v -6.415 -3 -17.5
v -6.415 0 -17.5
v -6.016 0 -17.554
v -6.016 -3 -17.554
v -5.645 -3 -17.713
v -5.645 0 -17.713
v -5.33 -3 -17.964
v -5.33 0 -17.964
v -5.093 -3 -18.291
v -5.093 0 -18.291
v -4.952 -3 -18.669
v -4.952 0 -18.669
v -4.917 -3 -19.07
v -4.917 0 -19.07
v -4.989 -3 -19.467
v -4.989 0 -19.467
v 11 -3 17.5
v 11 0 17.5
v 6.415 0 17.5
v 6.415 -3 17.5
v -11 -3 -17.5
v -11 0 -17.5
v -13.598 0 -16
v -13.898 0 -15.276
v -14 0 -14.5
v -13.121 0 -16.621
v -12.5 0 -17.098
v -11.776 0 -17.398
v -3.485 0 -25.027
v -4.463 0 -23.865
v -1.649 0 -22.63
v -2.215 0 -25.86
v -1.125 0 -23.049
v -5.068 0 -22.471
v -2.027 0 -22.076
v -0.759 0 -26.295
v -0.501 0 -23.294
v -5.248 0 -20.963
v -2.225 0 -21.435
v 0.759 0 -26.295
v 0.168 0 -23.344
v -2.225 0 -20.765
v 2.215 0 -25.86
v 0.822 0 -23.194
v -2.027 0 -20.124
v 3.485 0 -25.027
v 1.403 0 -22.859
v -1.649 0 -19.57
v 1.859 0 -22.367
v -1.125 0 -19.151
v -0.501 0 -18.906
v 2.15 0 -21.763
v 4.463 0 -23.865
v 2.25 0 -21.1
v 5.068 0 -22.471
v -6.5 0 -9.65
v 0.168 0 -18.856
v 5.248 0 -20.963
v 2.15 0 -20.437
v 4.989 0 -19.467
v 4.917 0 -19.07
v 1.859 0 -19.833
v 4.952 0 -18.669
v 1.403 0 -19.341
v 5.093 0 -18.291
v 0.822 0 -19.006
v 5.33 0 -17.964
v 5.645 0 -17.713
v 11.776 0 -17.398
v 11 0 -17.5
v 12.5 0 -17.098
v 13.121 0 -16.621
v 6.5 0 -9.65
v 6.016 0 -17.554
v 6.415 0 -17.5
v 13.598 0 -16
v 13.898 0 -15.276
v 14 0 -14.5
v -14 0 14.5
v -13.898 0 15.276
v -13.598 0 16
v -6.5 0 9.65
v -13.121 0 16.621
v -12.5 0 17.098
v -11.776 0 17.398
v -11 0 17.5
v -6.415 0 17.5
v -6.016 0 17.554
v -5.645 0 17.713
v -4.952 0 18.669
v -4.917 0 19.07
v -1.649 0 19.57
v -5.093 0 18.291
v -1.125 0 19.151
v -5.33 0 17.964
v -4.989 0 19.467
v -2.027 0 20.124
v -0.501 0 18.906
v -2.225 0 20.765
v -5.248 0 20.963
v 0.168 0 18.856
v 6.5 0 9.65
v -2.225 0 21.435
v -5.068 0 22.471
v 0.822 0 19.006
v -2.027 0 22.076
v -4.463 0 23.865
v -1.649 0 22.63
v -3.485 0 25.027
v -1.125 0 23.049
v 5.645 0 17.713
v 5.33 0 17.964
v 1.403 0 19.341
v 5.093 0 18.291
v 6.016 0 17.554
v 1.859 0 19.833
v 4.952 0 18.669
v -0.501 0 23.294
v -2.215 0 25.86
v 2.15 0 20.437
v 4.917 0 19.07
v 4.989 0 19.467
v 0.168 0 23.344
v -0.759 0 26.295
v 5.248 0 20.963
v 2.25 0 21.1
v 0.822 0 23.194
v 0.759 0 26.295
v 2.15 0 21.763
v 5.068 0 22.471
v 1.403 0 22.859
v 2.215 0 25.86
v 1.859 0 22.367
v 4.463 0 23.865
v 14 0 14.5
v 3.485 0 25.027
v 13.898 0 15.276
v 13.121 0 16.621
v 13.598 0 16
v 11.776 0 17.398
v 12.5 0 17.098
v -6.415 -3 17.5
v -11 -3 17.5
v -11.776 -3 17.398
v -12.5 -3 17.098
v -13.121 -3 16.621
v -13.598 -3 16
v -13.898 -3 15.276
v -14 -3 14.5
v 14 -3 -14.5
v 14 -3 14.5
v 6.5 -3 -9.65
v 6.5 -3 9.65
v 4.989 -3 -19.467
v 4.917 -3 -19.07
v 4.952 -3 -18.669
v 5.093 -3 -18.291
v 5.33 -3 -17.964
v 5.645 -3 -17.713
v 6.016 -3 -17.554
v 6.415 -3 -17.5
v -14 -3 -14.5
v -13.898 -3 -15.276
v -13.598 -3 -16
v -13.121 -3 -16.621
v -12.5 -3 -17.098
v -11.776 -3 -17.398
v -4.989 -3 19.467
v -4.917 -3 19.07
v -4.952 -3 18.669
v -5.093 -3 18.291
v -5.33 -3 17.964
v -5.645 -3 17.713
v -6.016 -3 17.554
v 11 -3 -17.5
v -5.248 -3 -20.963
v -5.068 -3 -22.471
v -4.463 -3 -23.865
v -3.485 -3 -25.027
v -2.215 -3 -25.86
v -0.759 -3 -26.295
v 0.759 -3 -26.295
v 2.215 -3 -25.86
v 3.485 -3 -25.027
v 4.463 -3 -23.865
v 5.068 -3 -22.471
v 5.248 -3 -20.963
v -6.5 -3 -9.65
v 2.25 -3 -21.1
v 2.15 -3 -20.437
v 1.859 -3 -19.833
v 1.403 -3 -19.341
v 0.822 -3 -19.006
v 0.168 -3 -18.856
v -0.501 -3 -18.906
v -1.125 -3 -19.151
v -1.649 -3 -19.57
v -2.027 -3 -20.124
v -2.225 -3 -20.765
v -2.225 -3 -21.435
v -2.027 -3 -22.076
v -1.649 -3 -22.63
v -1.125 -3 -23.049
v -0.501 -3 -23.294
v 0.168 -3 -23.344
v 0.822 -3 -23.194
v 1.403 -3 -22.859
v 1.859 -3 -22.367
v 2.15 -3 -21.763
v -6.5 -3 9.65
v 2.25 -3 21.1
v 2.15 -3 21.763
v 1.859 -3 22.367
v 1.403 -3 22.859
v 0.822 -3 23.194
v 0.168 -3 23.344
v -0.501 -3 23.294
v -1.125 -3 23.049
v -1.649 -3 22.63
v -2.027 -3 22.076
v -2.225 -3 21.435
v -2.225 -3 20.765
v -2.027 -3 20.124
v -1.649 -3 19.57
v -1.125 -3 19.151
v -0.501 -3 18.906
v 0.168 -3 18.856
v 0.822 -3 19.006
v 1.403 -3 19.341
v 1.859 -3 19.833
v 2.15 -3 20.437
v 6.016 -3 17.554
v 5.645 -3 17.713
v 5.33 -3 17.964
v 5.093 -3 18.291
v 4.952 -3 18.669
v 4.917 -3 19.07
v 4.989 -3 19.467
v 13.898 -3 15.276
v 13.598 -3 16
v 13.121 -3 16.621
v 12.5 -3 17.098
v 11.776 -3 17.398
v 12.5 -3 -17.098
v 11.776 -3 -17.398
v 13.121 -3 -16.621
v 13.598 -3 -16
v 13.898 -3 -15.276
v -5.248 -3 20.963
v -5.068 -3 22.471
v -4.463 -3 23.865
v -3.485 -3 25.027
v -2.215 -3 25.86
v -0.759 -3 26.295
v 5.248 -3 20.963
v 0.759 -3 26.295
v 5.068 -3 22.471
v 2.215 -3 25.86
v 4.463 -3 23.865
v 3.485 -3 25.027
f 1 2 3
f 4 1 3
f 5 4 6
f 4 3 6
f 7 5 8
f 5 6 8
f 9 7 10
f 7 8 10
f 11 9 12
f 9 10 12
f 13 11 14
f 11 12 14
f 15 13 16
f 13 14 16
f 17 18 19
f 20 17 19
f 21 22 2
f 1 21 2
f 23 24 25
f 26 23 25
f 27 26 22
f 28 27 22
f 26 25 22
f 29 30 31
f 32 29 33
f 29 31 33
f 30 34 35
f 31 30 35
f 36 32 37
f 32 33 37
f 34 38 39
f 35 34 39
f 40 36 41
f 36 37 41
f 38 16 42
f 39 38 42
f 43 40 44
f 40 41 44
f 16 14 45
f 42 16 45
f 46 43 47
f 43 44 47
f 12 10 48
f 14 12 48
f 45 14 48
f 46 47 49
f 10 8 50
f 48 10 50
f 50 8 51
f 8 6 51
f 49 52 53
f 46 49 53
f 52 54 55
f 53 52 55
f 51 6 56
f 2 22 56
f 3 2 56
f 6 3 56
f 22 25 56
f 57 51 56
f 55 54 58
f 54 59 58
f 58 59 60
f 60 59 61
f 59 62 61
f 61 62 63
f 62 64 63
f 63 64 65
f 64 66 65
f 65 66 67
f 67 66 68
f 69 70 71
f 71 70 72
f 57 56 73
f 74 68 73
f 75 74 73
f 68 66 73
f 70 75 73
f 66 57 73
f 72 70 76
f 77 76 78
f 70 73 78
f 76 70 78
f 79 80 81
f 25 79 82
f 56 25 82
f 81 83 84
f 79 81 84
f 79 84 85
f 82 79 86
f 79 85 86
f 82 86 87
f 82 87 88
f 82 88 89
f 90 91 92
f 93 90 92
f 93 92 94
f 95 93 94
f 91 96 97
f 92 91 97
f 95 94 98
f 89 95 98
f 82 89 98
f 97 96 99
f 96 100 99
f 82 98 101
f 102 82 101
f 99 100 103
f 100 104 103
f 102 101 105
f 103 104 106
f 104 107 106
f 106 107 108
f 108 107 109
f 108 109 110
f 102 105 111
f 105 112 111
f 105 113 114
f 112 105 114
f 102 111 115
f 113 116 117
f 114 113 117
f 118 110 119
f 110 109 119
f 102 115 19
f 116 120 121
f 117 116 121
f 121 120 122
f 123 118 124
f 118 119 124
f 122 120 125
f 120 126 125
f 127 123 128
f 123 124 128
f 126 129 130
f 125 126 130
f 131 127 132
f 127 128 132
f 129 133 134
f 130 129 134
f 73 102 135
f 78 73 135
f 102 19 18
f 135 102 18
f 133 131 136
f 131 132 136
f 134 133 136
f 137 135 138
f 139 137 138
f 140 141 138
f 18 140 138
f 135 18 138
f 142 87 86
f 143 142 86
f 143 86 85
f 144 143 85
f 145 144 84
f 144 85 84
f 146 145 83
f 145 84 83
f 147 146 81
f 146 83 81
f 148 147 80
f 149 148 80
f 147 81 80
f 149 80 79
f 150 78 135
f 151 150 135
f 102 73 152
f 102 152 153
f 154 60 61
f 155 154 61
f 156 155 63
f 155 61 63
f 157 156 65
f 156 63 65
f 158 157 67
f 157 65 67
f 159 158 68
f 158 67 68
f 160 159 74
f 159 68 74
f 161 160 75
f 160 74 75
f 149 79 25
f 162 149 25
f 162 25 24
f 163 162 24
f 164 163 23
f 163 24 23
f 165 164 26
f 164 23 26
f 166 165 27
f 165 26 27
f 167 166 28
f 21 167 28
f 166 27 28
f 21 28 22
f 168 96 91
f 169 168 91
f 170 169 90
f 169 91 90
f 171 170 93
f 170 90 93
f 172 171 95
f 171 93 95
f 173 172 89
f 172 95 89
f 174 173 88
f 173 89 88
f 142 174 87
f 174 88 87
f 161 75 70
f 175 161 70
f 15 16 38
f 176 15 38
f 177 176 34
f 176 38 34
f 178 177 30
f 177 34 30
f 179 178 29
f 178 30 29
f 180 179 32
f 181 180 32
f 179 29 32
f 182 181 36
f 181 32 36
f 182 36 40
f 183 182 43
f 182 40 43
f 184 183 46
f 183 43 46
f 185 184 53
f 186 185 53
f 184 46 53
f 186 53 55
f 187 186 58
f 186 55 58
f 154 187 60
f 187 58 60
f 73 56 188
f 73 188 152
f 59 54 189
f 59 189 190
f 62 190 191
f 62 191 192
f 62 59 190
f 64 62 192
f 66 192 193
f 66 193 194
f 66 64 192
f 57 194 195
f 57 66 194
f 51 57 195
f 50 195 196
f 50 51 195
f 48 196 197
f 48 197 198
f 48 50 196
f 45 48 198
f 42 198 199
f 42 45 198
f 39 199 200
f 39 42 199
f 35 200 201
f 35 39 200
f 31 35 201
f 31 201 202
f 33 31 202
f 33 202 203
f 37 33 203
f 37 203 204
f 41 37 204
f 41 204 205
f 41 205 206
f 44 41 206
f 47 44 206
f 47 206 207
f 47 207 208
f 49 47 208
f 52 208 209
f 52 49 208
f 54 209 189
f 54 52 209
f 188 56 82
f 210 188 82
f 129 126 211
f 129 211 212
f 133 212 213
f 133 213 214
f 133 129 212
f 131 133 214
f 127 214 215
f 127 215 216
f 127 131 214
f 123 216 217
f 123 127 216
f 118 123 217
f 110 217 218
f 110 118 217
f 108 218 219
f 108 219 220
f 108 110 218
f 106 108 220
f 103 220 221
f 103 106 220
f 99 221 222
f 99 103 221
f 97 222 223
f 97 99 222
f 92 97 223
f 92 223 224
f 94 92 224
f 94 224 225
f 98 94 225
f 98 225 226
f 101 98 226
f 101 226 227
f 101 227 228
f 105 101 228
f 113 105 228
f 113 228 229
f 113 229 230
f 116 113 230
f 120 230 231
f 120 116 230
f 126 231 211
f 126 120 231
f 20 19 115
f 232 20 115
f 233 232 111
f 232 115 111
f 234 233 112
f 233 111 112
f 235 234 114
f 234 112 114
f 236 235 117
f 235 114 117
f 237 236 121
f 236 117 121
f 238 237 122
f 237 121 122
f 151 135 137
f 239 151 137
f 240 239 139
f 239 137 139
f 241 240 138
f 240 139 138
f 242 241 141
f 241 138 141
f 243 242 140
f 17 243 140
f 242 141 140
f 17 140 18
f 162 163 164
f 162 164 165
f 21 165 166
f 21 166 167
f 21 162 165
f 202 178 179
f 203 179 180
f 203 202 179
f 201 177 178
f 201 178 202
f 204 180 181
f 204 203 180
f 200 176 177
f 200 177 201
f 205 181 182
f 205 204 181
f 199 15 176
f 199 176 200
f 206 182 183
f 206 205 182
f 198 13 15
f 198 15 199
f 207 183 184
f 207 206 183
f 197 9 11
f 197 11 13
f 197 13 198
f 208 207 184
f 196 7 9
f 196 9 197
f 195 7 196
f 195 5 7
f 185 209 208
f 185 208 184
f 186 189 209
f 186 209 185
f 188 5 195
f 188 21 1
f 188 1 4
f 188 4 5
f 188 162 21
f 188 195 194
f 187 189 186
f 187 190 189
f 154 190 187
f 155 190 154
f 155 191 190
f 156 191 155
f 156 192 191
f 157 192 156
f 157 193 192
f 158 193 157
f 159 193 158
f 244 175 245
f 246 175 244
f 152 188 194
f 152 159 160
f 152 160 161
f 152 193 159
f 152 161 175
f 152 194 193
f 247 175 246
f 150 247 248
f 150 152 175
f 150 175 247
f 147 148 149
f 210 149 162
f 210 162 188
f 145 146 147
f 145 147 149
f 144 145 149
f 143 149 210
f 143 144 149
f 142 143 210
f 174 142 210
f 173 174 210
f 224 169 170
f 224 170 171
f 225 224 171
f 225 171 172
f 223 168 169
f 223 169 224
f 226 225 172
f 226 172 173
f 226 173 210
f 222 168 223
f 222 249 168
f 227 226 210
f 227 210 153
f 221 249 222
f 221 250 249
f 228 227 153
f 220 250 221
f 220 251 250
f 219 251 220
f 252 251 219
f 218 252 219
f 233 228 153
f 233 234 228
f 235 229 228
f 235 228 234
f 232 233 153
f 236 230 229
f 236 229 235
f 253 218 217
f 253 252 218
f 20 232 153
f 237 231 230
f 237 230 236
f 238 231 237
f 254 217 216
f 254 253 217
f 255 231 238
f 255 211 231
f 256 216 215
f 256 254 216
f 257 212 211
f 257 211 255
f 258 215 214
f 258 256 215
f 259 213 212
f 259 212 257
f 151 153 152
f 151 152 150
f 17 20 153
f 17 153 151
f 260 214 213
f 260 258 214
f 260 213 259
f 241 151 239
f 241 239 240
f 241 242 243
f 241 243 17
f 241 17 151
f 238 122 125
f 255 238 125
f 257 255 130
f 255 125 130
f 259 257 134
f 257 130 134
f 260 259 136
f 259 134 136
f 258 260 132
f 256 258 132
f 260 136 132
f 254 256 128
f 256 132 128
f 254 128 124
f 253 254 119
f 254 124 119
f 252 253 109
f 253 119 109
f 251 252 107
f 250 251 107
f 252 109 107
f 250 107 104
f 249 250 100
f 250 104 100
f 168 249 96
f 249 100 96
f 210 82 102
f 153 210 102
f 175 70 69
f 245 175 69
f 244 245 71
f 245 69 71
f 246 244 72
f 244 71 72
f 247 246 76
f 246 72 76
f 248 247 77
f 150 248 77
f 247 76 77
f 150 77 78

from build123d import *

# Parameters (mm, degrees)
F0_R     = 2.25
F0_W     = 13
F0_H     = 19.3
F1_DEPTH = 3


# Not quite as in the source:
# - a feature names something its author has since deleted; it is built from what else it names


with BuildPart() as f1:
    # F0 (on Front) → F1 (new body)
    with BuildSketch(Plane.XZ):
        with BuildLine():
            Line((-6.4150214341, 17.5), (-11, 17.5))
            ThreePointArc((-11, 17.5), (-13.1213203436, 16.6213203436), (-14, 14.5))
            Line((-14, 14.5), (-14, -14.5))
            ThreePointArc((-14, -14.5), (-13.1213203436, -16.6213203436), (-11, -17.5))
            Line((-11, -17.5), (-6.4150214341, -17.5))
            ThreePointArc((-6.4150214341, -17.5), (-5.200525654, -18.1196591569), (-4.9894611154, -19.4666666667))
            ThreePointArc((-4.9894611154, -19.4666666667), (0, -26.35), (4.9894611154, -19.4666666667))
            ThreePointArc((4.9894611154, -19.4666666667), (5.200525654, -18.1196591569), (6.4150214341, -17.5))
            Line((6.4150214341, -17.5), (11, -17.5))
            ThreePointArc((11, -17.5), (13.1213203436, -16.6213203436), (14, -14.5))
            Line((14, -14.5), (14, 14.5))
            ThreePointArc((14, 14.5), (13.1213203436, 16.6213203436), (11, 17.5))
            Line((11, 17.5), (6.4150214341, 17.5))
            ThreePointArc((6.4150214341, 17.5), (5.200525654, 18.1196591569), (4.9894611154, 19.4666666667))
            ThreePointArc((4.9894611154, 19.4666666667), (0, 26.35), (-4.9894611154, 19.4666666667))
            ThreePointArc((-4.9894611154, 19.4666666667), (-5.200525654, 18.1196591569), (-6.4150214341, 17.5))
        make_face()
        with Locations((0, -21.1)):
            Circle(F0_R, mode=Mode.SUBTRACT)
        Rectangle(F0_W, F0_H, mode=Mode.SUBTRACT)
        with Locations((0, 21.1)):
            Circle(F0_R, mode=Mode.SUBTRACT)
    extrude(amount=F1_DEPTH)


solid = f1.part
